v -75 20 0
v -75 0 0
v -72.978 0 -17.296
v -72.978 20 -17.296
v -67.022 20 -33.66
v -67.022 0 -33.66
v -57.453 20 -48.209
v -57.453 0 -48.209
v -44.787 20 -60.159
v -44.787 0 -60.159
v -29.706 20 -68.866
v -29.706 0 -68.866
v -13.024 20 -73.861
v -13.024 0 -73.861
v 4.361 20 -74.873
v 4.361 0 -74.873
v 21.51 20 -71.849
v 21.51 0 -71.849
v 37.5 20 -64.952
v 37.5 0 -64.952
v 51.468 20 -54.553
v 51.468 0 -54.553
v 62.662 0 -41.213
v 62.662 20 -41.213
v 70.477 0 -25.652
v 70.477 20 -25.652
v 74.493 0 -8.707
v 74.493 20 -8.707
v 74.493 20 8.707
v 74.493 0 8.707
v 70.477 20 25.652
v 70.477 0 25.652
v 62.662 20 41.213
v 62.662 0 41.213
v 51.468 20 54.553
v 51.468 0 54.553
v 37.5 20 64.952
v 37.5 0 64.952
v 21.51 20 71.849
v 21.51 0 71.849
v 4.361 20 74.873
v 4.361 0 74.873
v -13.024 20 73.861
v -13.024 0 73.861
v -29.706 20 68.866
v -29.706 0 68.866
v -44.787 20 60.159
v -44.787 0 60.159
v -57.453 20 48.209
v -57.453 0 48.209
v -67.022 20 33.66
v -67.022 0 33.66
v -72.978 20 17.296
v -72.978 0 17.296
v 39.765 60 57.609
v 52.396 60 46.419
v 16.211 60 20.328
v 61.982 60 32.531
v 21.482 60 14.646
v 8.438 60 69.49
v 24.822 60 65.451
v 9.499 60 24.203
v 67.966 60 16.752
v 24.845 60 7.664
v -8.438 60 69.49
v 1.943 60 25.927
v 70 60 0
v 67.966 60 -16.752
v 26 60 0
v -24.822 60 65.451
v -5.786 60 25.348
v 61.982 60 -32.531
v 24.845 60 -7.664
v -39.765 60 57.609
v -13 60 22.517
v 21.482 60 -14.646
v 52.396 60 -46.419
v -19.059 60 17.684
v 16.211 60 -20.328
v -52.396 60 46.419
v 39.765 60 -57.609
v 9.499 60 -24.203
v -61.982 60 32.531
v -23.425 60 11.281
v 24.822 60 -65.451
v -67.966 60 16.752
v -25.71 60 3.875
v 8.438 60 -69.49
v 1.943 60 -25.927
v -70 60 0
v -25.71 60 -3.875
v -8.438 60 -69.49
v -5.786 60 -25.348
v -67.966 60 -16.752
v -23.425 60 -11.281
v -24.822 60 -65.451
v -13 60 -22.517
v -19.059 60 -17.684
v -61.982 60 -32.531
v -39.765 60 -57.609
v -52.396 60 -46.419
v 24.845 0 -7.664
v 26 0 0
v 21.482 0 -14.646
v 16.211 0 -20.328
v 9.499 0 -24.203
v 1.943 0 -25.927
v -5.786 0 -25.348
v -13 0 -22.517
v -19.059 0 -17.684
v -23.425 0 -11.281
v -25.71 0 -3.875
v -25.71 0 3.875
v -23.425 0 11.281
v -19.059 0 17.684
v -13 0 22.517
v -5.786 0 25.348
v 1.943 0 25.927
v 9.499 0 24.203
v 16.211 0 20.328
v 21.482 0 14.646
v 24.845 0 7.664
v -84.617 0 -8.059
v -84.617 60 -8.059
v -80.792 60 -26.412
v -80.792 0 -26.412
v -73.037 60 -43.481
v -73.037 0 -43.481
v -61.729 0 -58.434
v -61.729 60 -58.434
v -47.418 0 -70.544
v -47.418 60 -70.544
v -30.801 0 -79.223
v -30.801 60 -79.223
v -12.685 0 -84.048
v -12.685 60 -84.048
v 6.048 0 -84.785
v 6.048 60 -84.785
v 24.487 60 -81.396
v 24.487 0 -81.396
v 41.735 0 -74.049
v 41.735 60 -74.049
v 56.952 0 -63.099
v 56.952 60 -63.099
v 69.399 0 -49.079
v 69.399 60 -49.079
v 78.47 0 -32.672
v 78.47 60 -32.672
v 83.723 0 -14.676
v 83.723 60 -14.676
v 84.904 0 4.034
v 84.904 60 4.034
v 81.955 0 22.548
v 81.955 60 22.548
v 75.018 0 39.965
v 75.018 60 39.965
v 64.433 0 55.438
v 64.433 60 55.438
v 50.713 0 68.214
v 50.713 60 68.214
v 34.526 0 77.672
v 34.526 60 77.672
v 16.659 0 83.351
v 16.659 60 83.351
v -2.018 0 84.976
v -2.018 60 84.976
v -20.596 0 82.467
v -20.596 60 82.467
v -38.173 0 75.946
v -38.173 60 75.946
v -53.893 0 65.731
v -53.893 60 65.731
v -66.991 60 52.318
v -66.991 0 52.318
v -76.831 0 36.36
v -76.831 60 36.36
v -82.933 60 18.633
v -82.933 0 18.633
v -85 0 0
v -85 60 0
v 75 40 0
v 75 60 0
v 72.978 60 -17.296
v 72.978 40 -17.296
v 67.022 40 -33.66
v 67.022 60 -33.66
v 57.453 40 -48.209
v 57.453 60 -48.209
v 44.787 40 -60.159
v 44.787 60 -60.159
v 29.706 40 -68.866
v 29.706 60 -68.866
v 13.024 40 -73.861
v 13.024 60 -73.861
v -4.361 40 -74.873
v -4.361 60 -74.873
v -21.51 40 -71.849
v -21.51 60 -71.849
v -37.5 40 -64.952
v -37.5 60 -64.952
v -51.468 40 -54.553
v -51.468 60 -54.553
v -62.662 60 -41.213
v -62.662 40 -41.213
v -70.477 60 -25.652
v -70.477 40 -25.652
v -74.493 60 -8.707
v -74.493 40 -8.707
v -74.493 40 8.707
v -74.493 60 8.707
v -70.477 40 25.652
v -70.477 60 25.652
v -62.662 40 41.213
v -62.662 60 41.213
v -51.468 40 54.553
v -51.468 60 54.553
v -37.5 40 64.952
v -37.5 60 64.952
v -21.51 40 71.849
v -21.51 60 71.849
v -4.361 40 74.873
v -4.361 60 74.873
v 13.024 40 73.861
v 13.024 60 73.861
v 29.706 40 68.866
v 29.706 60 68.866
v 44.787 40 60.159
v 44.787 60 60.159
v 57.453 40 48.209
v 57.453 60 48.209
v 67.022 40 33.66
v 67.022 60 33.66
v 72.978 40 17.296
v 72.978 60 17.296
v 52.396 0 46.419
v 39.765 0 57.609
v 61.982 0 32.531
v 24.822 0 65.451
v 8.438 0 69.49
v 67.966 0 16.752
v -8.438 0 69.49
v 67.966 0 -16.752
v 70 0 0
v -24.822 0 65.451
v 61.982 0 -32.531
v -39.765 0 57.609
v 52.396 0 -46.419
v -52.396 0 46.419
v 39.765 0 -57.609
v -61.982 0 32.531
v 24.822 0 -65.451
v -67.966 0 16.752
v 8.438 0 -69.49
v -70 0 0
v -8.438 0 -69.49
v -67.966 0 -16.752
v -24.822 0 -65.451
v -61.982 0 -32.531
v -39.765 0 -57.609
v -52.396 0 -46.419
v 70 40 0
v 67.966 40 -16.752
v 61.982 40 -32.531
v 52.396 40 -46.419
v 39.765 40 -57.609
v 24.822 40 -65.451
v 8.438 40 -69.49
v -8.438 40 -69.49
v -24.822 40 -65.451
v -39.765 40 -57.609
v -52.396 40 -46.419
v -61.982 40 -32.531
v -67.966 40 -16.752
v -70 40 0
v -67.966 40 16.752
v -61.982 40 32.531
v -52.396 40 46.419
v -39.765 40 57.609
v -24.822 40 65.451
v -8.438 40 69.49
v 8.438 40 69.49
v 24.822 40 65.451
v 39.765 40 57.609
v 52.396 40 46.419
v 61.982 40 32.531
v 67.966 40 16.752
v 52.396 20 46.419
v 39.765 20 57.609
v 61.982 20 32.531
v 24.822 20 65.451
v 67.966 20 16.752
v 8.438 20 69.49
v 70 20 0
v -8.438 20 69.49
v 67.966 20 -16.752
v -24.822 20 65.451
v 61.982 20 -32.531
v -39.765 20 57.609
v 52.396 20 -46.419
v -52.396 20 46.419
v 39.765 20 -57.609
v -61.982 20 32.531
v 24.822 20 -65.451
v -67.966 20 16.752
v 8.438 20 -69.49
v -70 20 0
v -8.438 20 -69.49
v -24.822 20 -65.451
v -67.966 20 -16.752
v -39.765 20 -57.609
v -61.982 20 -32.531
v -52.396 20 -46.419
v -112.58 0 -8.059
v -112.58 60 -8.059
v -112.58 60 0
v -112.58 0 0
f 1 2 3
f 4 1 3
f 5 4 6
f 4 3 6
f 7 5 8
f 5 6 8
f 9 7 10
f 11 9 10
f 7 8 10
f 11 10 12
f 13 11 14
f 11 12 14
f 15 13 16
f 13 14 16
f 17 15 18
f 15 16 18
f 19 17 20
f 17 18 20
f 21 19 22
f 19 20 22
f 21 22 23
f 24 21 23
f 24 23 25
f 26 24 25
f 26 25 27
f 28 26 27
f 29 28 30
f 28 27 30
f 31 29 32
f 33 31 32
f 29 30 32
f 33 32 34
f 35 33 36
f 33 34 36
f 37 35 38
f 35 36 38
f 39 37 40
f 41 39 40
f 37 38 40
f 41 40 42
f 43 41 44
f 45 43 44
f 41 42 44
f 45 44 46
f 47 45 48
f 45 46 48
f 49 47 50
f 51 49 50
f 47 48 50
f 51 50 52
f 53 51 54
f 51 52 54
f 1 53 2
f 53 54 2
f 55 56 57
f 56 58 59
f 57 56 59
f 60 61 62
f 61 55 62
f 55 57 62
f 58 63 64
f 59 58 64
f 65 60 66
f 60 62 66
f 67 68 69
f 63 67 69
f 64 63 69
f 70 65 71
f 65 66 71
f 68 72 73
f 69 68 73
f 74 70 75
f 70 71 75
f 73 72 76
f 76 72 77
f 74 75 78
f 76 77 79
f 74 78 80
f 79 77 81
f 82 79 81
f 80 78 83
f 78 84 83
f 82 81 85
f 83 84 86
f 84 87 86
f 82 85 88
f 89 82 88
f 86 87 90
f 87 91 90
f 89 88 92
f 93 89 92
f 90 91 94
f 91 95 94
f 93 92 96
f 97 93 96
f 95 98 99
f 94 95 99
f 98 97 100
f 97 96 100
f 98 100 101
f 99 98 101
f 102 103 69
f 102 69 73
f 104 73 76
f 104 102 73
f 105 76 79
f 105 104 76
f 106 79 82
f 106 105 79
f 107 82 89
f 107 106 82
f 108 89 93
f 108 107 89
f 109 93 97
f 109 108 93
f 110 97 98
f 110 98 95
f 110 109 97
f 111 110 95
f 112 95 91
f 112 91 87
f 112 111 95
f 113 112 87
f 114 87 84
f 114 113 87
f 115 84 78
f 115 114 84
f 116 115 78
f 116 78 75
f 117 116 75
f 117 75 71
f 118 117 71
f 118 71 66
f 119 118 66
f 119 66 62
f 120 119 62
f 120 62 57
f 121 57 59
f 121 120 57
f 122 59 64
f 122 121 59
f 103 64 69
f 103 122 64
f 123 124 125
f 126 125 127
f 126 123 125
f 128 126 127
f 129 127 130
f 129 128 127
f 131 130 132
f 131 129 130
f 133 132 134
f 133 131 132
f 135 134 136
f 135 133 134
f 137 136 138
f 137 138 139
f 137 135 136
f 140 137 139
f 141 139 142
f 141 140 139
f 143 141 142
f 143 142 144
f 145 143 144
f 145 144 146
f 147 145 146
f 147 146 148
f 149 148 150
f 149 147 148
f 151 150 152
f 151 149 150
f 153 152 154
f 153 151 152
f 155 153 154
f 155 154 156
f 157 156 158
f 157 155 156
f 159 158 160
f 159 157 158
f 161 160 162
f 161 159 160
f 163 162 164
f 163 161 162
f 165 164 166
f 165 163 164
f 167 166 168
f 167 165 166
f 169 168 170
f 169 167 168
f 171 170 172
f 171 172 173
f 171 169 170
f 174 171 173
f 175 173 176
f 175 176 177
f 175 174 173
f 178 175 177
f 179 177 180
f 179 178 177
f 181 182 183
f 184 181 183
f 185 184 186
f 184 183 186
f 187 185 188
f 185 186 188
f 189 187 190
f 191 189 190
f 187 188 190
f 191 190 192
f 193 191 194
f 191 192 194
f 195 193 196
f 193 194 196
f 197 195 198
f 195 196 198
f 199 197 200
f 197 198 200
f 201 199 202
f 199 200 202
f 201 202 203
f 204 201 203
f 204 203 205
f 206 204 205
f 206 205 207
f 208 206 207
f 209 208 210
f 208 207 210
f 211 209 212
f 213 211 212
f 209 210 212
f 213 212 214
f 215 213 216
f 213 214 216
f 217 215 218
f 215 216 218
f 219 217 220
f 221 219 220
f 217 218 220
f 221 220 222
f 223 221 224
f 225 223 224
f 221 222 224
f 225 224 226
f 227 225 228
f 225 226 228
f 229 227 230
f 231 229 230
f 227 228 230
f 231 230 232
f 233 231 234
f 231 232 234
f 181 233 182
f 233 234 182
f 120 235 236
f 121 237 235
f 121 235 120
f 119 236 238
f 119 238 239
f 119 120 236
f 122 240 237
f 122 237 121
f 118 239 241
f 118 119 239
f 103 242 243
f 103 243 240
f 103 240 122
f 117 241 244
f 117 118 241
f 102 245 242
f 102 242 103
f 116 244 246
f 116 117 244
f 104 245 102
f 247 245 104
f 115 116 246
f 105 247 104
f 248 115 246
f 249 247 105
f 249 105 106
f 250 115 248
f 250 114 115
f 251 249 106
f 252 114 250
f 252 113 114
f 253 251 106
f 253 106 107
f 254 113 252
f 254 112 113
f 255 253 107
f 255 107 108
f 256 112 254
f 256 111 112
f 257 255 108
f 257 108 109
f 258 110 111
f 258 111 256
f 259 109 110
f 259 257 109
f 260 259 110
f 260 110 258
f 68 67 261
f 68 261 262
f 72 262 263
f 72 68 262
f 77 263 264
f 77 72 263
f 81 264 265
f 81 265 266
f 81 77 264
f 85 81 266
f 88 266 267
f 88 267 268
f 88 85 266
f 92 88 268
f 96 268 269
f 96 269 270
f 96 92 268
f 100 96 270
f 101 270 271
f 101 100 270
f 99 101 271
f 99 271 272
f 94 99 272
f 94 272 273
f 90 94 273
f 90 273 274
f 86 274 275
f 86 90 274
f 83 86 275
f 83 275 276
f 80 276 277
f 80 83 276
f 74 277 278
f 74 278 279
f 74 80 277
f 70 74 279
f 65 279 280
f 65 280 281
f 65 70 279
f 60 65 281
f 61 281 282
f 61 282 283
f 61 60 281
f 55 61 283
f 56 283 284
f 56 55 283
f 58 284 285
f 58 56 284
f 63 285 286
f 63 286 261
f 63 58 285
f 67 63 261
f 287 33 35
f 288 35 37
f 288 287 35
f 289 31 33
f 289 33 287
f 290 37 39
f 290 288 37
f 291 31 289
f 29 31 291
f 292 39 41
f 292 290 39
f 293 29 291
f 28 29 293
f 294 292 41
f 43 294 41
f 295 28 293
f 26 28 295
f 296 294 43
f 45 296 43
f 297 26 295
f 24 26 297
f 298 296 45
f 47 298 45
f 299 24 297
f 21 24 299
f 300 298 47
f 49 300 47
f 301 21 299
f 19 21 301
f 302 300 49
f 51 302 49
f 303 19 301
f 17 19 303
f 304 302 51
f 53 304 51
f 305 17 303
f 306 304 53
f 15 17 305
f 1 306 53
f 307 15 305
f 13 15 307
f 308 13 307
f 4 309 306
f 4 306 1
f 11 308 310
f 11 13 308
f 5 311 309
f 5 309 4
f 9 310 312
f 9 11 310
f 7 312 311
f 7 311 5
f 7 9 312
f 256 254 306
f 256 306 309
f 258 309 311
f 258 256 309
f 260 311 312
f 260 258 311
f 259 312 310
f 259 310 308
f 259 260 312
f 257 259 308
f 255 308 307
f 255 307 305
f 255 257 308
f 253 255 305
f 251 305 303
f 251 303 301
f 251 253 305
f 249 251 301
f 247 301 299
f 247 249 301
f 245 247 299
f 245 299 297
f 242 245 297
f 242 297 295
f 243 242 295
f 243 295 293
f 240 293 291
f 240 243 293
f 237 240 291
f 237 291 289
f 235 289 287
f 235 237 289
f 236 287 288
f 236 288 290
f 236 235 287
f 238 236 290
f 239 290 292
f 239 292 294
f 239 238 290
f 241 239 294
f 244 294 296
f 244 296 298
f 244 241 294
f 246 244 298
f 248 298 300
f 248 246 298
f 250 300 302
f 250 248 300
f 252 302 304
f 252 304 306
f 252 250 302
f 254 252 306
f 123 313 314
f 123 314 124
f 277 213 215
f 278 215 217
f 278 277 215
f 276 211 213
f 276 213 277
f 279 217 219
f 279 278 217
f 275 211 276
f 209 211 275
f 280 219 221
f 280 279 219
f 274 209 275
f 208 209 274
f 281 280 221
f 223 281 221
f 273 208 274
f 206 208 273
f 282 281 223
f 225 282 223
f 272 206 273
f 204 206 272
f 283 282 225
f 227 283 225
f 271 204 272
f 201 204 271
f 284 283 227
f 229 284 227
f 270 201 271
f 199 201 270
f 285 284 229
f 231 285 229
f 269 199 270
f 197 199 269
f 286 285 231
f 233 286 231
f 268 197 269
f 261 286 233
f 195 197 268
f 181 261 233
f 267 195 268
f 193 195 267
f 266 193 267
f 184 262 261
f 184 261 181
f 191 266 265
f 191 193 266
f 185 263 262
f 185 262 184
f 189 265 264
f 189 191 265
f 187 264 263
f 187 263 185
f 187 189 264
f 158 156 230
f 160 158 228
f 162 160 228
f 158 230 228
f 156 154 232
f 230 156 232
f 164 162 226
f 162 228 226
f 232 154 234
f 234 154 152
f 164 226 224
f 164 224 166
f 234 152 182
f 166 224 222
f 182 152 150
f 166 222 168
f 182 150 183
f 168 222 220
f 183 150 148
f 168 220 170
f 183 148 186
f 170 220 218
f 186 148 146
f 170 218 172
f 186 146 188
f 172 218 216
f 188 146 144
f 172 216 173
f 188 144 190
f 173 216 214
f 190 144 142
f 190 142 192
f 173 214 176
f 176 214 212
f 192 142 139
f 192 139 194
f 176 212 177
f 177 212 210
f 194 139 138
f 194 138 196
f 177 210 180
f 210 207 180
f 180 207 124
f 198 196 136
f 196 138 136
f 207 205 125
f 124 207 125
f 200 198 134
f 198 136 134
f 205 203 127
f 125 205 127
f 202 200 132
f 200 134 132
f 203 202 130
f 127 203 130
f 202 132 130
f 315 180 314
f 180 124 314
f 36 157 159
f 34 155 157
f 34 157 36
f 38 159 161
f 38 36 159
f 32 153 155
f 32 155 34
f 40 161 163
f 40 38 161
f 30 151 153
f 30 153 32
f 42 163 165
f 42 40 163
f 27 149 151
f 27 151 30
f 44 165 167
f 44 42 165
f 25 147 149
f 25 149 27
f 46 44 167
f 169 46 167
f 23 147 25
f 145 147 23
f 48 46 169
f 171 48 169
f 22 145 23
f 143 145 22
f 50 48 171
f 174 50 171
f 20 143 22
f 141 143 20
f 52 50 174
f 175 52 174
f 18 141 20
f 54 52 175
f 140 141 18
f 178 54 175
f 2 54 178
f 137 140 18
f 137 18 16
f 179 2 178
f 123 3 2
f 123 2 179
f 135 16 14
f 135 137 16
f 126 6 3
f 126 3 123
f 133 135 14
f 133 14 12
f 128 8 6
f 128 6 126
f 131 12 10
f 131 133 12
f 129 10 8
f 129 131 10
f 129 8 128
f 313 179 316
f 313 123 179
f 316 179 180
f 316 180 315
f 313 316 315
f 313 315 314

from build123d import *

# Parameters (mm, degrees)
SKETCH1_R           = 26
BOSS_EXTRUDE1_DEPTH = 60
SKETCH2_R           = 75
SKETCH2_R_2         = 70
CUT_EXTRUDE1_DEPTH  = 20
SKETCH3_R           = 75
SKETCH3_R_2         = 70
CUT_EXTRUDE2_DEPTH  = 20


with BuildPart() as part:
    # Sketch1 → Boss-Extrude1 (new body)
    with BuildSketch(Plane(origin=(0, 0, 0), x_dir=(1, 0, 0), z_dir=(0, 1, 0))):
        with BuildLine():
            Line((-85, 0), (-112.580048144, 0))
            Line((-112.580048144, 0), (-112.580048144, 8.059280082))
            Line((-112.580048144, 8.059280082), (-84.617066863, 8.059280082))
            ThreePointArc((-84.617066863, 8.059280082), (84.904212744, -4.034186201), (-85, 0))
        make_face()
        Circle(SKETCH1_R, mode=Mode.SUBTRACT)
    extrude(amount=BOSS_EXTRUDE1_DEPTH)

    # Sketch2 → Cut-Extrude1 (cut)
    with BuildSketch(Plane(origin=(0, 0, 0), x_dir=(-1, 0, 0), z_dir=(0, -1, 0))):
        Circle(SKETCH2_R)
        Circle(SKETCH2_R_2, mode=Mode.SUBTRACT)
    extrude(amount=-CUT_EXTRUDE1_DEPTH, mode=Mode.SUBTRACT)

    # Sketch3 → Cut-Extrude2 (cut)
    with BuildSketch(Plane(origin=(0, 60, 0), x_dir=(1, 0, 0), z_dir=(0, 1, 0))):
        Circle(SKETCH3_R)
        Circle(SKETCH3_R_2, mode=Mode.SUBTRACT)
    extrude(amount=-CUT_EXTRUDE2_DEPTH, mode=Mode.SUBTRACT)


solid = part.part
